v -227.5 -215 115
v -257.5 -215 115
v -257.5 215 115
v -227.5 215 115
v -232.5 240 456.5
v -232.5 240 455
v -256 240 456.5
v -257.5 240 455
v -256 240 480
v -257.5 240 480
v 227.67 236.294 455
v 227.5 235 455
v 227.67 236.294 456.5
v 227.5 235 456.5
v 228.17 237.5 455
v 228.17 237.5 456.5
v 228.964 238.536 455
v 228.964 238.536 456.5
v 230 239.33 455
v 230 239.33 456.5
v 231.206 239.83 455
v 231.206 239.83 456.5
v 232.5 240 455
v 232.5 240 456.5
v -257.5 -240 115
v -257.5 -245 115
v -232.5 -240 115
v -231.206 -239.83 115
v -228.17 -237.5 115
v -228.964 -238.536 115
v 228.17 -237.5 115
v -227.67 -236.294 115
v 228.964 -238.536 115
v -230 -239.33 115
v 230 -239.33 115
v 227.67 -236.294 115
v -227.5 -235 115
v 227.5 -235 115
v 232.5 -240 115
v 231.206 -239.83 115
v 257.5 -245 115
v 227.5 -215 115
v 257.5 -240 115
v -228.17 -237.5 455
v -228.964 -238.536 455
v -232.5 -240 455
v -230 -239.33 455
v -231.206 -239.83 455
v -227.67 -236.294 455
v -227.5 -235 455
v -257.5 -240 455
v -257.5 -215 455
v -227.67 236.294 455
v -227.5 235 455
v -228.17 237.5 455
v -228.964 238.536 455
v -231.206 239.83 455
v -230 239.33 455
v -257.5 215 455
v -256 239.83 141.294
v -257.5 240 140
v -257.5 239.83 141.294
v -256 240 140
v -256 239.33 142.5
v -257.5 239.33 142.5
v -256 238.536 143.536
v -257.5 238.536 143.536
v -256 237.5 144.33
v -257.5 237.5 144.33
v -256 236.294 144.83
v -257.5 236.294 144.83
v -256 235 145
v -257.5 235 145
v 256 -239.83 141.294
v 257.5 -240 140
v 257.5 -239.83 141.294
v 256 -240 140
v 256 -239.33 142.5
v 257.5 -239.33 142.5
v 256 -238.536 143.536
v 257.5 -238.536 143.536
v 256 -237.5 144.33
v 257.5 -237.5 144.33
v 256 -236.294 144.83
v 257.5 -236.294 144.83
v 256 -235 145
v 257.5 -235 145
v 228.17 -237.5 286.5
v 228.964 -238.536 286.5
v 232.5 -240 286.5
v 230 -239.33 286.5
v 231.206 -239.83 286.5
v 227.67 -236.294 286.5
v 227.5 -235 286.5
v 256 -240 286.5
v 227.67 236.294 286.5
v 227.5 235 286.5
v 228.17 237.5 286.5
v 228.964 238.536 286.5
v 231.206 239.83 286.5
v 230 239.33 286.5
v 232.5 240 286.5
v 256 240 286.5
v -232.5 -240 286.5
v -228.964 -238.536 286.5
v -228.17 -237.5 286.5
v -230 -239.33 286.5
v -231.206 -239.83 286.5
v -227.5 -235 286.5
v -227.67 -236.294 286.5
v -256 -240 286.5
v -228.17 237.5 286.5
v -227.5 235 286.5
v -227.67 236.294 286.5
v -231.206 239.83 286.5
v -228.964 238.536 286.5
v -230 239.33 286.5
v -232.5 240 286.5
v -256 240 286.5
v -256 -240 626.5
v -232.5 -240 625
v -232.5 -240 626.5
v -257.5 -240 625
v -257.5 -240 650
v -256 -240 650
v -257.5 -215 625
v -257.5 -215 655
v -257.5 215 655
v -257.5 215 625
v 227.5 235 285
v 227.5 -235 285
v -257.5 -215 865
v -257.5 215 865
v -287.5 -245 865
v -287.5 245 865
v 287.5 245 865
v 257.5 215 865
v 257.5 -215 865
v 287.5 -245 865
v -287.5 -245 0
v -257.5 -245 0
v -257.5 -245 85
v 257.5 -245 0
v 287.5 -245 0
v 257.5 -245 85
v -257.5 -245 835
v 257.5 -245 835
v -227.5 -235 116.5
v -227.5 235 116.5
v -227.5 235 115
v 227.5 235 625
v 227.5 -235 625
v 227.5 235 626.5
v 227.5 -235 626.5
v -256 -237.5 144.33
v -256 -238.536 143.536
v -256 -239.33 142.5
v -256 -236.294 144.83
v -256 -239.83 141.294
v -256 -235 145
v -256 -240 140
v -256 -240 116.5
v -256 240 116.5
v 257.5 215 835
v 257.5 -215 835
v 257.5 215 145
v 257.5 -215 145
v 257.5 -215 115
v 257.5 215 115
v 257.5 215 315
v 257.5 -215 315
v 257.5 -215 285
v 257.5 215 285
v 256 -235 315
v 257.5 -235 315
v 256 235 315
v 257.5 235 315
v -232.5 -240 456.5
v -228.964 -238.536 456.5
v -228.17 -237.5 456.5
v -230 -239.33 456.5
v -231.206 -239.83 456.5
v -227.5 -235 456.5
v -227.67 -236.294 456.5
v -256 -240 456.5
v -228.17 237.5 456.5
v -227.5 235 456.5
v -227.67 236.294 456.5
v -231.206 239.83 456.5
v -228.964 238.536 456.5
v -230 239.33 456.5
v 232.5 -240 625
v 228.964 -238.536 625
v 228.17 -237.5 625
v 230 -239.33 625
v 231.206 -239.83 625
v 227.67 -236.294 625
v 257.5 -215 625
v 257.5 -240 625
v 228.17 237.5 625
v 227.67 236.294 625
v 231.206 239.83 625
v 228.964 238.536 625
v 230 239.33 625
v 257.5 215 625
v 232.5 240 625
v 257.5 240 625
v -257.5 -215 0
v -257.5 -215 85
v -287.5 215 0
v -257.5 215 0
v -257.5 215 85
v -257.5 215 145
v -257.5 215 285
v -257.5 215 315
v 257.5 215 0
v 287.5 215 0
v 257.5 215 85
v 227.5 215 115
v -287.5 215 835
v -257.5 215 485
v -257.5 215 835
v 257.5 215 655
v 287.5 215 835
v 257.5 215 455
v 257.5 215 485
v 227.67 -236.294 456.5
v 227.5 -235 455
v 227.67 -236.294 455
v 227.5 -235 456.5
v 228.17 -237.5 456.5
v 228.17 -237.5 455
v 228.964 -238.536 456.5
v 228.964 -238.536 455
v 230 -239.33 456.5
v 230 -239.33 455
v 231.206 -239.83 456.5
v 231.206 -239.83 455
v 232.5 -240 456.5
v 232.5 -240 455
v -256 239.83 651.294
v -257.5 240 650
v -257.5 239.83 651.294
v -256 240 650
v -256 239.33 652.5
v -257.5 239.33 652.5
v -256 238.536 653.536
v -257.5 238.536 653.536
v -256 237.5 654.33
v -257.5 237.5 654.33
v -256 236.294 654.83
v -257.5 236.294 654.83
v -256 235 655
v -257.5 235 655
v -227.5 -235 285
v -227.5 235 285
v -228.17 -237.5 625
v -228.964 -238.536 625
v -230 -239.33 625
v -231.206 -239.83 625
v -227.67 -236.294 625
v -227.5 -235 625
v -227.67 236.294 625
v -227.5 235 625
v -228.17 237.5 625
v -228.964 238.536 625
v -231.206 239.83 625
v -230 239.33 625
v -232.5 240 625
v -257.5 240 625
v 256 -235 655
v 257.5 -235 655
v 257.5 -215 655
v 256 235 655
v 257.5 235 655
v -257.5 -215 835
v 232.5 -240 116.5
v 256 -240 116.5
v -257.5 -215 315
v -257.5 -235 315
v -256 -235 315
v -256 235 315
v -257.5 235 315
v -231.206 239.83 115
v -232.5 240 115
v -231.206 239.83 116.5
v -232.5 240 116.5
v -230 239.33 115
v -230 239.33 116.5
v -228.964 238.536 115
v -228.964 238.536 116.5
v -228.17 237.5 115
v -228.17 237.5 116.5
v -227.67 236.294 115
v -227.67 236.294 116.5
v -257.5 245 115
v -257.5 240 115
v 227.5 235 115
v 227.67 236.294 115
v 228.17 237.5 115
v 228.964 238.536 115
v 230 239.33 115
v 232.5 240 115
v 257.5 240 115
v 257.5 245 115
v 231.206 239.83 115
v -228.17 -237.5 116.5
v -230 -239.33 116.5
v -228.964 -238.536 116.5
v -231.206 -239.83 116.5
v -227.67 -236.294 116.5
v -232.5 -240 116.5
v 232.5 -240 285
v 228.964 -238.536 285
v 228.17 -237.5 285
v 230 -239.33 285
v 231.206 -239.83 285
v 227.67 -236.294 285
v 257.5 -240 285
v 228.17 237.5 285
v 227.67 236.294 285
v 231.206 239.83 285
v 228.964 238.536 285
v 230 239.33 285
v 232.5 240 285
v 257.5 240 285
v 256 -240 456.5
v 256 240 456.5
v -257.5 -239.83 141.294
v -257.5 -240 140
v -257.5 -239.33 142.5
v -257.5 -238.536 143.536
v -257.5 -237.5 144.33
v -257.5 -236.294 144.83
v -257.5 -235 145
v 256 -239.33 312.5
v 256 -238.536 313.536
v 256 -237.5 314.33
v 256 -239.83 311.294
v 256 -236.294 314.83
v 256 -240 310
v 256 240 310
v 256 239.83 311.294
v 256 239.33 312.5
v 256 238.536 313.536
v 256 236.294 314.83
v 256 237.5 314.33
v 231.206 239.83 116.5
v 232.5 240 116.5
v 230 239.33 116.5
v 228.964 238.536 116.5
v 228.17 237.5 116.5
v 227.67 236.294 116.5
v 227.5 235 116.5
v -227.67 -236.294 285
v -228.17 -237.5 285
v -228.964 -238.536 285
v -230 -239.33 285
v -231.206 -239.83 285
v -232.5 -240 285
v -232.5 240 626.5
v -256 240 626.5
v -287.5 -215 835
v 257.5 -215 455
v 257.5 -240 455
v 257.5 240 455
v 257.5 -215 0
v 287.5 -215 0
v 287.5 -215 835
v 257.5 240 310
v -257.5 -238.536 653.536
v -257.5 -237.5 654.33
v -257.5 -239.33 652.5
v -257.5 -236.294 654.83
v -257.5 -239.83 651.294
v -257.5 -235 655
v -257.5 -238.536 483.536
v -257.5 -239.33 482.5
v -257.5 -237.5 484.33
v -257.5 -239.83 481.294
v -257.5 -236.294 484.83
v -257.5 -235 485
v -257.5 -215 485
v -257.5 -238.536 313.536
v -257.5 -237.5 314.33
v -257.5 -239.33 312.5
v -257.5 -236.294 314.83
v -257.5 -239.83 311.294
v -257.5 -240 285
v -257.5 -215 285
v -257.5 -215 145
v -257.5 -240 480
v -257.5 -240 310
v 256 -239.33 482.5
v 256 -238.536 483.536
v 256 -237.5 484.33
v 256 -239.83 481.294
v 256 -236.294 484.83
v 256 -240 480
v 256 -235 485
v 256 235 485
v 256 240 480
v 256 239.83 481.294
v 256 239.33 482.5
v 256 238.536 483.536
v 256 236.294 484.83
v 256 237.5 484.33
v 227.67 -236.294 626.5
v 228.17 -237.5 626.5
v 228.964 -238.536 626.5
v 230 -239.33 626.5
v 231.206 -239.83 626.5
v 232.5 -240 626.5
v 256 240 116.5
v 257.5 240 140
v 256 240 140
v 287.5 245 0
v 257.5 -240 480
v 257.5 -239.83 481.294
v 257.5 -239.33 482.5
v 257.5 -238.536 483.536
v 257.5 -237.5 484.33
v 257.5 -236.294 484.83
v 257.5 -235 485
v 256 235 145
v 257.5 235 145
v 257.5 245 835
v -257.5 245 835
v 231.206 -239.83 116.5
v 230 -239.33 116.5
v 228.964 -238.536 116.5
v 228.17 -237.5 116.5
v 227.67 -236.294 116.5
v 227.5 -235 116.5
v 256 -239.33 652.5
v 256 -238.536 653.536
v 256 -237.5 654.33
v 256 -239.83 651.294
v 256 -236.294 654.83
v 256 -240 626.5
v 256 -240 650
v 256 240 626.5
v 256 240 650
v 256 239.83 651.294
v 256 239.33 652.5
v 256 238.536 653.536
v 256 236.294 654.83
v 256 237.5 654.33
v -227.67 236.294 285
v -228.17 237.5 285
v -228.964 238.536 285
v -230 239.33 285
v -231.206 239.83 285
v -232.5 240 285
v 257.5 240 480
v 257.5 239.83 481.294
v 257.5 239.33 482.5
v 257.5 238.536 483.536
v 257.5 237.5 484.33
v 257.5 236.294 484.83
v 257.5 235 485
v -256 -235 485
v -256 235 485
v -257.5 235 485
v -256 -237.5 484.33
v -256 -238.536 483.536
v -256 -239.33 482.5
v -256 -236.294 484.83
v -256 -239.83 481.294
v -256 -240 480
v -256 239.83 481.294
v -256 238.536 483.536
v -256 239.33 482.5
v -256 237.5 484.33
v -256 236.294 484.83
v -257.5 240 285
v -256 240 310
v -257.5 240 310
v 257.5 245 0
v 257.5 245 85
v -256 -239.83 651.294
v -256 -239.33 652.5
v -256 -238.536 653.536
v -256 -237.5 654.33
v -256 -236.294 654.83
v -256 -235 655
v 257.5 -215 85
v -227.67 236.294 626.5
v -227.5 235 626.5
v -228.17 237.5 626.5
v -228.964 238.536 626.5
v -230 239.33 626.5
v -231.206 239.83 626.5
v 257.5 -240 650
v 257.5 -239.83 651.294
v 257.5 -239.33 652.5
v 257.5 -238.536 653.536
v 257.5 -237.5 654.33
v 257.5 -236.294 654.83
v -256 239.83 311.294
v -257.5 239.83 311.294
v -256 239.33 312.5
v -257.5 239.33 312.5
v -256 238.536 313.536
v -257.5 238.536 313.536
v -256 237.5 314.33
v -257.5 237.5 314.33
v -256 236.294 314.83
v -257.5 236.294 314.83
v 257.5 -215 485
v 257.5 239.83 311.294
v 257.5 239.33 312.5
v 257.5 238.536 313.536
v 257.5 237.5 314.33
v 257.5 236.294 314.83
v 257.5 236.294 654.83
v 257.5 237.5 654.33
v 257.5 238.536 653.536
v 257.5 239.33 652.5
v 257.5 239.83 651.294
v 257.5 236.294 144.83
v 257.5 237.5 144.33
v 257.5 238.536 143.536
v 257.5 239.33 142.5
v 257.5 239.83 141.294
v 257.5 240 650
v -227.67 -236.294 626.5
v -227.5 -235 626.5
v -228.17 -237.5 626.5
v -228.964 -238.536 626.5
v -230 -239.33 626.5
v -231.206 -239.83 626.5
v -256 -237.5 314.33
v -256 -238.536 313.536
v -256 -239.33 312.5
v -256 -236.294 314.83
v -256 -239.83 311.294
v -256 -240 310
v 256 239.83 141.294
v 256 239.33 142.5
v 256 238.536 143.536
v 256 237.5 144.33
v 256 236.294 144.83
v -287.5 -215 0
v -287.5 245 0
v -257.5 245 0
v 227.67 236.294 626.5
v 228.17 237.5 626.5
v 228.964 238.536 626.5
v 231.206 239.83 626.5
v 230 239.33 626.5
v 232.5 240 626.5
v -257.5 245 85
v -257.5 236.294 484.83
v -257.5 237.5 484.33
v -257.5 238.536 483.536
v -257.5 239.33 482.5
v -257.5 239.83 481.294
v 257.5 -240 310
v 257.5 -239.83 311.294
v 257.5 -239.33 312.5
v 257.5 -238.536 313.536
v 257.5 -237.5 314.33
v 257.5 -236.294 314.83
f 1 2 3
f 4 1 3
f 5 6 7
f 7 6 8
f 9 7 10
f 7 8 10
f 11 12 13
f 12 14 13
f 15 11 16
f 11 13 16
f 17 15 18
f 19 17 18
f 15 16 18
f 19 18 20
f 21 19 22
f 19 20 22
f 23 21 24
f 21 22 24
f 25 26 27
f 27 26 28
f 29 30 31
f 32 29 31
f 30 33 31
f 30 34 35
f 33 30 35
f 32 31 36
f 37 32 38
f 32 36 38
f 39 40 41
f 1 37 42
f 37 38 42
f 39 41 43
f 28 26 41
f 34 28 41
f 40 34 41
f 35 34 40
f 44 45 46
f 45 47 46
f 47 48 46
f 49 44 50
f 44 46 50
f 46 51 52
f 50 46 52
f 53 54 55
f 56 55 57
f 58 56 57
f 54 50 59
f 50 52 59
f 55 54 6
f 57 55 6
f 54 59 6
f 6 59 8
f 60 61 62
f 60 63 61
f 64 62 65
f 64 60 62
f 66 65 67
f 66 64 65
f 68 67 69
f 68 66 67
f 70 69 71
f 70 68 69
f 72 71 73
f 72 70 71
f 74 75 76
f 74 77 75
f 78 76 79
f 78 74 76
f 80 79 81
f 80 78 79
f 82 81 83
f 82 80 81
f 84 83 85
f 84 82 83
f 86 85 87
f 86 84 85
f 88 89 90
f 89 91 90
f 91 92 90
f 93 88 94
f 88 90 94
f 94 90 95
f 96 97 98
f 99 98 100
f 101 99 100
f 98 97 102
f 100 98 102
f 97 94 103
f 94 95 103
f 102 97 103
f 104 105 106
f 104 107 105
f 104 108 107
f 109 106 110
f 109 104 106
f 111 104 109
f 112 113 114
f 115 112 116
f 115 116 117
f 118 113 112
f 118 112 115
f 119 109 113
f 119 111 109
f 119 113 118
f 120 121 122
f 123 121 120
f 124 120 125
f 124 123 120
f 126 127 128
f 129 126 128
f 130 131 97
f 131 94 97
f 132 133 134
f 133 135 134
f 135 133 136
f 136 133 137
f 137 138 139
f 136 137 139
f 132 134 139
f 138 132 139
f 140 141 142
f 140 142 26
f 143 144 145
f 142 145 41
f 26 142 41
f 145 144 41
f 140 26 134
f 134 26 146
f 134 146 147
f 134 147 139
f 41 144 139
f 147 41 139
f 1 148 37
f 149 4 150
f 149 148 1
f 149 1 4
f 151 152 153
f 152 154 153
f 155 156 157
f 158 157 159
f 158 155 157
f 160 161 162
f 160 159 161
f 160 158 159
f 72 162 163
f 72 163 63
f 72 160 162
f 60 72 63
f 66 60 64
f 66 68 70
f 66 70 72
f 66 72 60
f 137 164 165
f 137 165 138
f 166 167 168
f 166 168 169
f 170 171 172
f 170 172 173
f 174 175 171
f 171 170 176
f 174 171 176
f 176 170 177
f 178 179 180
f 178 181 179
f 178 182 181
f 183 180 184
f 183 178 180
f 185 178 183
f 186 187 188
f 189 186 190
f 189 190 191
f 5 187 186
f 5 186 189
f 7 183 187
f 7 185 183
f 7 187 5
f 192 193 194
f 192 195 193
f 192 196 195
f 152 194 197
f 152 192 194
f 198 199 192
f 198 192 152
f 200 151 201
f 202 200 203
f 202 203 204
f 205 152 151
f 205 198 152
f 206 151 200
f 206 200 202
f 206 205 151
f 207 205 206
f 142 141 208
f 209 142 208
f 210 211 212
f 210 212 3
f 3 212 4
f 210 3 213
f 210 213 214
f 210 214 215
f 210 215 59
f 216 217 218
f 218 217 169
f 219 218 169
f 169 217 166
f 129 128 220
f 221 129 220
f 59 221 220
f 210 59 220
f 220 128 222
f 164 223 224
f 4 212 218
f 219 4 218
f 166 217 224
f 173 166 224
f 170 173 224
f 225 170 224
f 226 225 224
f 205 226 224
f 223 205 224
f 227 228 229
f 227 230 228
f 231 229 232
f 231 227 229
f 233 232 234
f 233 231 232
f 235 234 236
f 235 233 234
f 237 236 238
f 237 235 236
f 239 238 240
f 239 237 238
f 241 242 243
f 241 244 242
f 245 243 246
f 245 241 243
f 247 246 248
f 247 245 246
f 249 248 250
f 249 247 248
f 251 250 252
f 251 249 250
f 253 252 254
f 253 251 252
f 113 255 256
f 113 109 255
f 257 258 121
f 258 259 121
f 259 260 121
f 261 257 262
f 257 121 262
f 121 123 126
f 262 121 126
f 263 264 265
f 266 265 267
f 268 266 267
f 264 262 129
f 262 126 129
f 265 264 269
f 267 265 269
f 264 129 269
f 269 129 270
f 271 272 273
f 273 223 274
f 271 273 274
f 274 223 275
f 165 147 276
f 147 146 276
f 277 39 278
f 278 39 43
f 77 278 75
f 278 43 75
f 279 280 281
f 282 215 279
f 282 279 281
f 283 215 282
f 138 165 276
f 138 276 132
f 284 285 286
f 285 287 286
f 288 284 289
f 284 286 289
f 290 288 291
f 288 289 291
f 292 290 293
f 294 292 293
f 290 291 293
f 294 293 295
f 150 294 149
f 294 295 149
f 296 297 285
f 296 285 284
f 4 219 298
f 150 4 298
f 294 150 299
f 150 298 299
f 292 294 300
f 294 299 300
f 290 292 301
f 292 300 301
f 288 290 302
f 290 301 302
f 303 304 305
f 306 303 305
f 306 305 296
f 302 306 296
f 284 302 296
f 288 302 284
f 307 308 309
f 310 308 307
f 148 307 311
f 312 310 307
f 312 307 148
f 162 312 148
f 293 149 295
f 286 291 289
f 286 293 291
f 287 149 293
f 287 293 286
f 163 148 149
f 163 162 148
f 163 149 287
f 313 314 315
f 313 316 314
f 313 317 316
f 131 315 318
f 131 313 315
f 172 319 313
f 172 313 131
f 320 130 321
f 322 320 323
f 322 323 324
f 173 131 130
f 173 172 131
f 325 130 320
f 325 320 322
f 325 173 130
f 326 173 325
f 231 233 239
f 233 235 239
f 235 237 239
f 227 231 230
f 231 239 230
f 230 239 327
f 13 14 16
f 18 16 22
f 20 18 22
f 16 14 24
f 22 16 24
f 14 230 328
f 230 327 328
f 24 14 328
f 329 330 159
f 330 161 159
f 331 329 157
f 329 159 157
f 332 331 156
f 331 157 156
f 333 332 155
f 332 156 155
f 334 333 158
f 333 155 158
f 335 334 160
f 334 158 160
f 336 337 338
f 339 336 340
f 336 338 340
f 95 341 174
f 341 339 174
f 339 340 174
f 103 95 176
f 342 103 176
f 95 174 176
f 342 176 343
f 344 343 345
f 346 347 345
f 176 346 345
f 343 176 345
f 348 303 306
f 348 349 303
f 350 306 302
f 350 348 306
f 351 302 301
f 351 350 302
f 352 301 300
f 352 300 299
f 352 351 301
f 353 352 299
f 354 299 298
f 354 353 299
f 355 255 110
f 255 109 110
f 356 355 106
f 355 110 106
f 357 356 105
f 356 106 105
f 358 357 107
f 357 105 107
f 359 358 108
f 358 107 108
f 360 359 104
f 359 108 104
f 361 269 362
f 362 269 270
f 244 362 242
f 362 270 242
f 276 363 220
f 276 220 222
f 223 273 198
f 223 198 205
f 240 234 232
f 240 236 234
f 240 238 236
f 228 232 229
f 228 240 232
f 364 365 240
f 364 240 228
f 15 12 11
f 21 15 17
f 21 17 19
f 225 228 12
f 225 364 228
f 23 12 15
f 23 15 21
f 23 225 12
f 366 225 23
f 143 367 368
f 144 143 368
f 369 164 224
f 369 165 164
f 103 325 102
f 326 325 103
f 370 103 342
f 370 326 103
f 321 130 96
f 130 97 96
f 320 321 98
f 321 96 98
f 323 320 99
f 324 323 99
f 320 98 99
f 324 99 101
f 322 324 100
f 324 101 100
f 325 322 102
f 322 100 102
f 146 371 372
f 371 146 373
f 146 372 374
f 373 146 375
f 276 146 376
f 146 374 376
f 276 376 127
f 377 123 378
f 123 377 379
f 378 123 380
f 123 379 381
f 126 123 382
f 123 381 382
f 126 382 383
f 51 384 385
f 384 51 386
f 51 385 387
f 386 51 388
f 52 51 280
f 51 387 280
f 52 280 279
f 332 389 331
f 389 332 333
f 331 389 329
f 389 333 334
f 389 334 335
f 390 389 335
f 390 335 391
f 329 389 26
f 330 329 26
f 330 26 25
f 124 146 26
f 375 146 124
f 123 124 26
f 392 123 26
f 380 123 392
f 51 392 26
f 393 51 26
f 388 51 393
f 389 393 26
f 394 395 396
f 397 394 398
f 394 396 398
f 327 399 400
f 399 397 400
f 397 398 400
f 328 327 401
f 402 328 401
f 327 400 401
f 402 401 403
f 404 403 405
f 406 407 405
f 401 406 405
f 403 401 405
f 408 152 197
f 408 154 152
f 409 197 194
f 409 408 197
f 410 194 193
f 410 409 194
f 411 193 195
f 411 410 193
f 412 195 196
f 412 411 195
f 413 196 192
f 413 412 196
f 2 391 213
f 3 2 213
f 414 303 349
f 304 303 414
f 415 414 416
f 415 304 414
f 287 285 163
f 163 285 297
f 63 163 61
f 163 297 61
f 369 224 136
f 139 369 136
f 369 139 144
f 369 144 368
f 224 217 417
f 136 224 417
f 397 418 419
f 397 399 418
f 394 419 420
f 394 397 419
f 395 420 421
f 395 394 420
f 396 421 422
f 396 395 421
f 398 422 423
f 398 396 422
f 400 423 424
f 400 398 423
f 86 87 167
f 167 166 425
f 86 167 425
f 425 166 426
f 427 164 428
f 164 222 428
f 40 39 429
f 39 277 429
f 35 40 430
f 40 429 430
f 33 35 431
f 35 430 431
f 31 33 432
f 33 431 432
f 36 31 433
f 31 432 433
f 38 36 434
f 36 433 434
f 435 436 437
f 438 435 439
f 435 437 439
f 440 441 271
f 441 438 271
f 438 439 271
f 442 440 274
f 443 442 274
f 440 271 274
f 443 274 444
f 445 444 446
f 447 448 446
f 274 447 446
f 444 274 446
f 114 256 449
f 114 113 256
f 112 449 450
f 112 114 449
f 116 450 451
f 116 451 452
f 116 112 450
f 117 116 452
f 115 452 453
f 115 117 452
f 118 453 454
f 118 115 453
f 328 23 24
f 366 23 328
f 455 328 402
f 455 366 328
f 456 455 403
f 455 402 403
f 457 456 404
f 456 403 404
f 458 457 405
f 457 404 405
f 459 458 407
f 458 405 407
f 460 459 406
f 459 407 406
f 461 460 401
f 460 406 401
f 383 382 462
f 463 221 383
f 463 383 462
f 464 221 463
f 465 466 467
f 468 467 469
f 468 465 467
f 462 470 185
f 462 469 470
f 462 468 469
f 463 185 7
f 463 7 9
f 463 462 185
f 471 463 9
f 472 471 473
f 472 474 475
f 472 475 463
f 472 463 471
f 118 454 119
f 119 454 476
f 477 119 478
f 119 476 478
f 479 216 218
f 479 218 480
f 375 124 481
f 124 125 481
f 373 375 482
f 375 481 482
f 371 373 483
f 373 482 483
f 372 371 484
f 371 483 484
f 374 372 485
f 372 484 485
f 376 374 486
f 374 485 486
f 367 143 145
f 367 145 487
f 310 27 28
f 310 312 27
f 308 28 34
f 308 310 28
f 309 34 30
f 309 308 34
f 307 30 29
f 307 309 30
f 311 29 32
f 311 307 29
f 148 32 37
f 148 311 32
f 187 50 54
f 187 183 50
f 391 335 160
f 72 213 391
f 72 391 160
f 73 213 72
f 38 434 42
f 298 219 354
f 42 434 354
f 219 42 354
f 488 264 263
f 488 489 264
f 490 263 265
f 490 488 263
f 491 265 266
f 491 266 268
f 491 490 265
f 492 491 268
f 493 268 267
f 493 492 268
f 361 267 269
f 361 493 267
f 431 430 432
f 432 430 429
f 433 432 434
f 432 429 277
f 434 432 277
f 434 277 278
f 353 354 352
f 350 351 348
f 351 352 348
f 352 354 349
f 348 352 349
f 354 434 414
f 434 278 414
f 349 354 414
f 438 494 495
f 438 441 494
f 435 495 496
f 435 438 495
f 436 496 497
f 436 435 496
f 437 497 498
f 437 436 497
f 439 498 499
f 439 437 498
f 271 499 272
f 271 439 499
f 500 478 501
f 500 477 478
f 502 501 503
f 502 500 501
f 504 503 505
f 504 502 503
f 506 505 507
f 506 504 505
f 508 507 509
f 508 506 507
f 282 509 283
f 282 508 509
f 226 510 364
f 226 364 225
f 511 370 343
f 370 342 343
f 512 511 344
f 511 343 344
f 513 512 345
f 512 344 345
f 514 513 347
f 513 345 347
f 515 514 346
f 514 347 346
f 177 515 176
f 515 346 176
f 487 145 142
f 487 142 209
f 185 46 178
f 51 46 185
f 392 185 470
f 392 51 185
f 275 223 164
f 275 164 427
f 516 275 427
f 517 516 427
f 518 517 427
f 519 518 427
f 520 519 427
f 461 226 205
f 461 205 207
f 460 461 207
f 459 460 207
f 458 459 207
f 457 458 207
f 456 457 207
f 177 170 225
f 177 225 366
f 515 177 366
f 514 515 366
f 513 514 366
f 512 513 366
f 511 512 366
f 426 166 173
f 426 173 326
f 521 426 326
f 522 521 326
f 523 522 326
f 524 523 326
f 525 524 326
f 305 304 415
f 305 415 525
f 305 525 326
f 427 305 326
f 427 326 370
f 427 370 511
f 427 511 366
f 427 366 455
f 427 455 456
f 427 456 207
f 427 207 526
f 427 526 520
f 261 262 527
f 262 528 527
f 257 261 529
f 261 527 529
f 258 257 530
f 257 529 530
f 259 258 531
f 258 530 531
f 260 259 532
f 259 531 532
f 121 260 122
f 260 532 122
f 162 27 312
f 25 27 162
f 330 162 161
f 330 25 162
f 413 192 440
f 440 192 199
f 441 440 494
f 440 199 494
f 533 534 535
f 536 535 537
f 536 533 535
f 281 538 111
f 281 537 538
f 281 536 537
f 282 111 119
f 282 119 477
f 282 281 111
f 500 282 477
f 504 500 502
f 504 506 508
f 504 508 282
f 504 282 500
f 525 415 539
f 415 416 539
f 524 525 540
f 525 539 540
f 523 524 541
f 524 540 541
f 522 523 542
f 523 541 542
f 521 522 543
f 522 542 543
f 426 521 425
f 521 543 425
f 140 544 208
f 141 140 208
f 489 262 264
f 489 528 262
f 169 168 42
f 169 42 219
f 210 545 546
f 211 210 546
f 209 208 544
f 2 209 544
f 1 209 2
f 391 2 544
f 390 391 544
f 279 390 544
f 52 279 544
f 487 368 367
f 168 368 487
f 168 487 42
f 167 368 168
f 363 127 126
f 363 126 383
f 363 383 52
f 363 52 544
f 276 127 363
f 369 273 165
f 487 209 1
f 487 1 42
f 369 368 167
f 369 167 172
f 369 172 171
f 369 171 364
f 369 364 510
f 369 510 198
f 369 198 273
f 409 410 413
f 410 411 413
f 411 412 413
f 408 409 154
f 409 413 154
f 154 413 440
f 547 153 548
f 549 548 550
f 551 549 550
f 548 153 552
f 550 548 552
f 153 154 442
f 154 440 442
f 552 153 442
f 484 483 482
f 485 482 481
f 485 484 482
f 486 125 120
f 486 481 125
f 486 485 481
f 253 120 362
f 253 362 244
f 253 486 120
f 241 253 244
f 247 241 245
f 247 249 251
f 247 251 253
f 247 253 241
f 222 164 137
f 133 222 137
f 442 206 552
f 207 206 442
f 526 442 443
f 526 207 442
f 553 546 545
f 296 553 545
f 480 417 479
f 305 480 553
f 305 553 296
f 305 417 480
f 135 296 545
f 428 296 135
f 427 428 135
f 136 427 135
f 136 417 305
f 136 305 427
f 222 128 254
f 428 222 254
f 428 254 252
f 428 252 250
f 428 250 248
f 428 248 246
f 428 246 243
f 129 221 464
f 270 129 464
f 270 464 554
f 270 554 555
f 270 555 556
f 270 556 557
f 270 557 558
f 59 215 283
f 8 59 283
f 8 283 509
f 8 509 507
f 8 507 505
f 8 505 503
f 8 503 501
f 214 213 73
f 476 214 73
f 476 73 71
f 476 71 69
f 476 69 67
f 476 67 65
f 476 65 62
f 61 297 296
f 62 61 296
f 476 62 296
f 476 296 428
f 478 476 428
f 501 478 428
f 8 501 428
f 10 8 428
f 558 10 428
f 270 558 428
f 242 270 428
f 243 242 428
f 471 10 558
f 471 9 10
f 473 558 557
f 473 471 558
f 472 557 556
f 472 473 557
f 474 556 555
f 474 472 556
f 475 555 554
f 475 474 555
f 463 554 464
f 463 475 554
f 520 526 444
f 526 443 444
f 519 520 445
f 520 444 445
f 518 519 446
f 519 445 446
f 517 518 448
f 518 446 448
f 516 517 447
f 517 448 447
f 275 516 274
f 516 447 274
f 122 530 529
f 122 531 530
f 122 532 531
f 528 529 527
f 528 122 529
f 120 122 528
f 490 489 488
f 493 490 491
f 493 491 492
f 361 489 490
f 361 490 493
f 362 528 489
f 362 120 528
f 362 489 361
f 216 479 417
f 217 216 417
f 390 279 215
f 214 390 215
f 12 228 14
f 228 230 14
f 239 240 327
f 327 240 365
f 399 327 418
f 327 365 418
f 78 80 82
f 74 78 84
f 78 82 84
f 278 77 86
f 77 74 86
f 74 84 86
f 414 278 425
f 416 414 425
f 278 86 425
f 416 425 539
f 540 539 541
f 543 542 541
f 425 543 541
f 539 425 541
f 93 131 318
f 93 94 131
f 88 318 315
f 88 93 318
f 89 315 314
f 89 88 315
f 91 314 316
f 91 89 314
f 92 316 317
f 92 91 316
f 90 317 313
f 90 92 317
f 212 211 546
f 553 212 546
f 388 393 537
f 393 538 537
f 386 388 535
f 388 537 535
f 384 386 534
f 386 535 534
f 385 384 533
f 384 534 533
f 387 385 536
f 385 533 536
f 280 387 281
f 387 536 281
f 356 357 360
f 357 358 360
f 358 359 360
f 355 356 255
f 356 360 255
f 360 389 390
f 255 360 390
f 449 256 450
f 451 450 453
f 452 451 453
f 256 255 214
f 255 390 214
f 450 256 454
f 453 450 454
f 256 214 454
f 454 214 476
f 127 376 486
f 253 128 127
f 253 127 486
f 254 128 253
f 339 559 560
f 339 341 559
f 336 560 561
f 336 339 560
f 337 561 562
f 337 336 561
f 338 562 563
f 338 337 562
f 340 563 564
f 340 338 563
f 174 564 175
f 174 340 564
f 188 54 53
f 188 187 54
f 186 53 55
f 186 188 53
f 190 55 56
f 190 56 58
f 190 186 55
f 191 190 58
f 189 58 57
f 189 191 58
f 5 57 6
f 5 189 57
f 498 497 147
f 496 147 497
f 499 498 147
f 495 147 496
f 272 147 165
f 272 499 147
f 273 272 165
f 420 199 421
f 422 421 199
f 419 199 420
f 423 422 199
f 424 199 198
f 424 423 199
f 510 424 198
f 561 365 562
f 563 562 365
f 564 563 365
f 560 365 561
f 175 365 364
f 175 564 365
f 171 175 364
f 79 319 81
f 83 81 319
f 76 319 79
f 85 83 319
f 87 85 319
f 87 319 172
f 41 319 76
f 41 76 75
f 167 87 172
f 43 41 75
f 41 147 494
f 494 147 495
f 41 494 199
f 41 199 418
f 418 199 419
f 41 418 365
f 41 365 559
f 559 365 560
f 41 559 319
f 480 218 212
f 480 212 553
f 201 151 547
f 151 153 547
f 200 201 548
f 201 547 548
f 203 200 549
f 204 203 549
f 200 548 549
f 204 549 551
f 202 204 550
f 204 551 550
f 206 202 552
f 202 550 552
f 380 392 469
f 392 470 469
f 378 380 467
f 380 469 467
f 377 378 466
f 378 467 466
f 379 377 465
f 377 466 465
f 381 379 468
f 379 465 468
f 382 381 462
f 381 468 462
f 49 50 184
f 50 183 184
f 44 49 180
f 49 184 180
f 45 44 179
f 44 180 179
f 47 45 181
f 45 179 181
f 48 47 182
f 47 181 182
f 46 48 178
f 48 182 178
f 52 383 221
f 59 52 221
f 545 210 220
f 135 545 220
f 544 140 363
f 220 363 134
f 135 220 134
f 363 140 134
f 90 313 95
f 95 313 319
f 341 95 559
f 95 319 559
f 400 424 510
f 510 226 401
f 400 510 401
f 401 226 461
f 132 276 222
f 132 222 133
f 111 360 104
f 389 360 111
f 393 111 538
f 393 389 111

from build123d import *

# Parameters (mm, degrees)
F0_W          = 30
F0_H          = 30
F1_DEPTH      = 865
F2_W          = 30
F2_H          = 30
F3_DEPTH      = 257.5
F3_DEPTH_BACK = 257.5
F4_W          = 30
F4_H          = 30
F5_DEPTH      = 215
F5_DEPTH_BACK = 215
F6_W          = 480
F6_H          = 30
F7_DEPTH      = 1.5
F8_W          = 480
F8_H          = 1.5
F9_DEPTH      = 28.5
F10_R         = 5


with BuildPart() as f1:
    # F0 (on Top) → F1 (new body)
    with BuildSketch(Plane.XY):
        with Locations((-272.5, 230)):
            Rectangle(F0_W, F0_H)
        with Locations((272.5, 230)):
            Rectangle(F0_W, F0_H)
        with Locations((272.5, -230)):
            Rectangle(F0_W, F0_H)
        with Locations((-272.5, -230)):
            Rectangle(F0_W, F0_H)
    extrude(amount=F1_DEPTH)

    # F2 (on Right) → F3 (join, two sides)
    with BuildSketch(Plane.YZ) as f3_sk:
        with Locations((-230, 100)):
            Rectangle(F2_W, F2_H)
        with Locations((230, 100)):
            Rectangle(F2_W, F2_H)
        with Locations((-230, 850)):
            Rectangle(F2_W, F2_H)
        with Locations((230, 850)):
            Rectangle(F2_W, F2_H)
    extrude(amount=F3_DEPTH)
    extrude(f3_sk.sketch, amount=-F3_DEPTH_BACK)

    # F4 (on Front) → F5 (join, two sides)
    with BuildSketch(Plane.XZ) as f5_sk:
        with Locations((-272.5, 850)):
            Rectangle(F4_W, F4_H)
        with Locations((272.5, 850)):
            Rectangle(F4_W, F4_H)
    extrude(amount=F5_DEPTH)
    extrude(f5_sk.sketch, amount=-F5_DEPTH_BACK)



with BuildPart() as f7:
    # F6 (on face) → F7 (new body)
    with BuildSketch(Plane.YZ.offset(-257.5)):
        with Locations((0, 130)):
            Rectangle(F6_W, F6_H)
        with Locations((0, 300)):
            Rectangle(F6_W, F6_H)
        with Locations((0, 470)):
            Rectangle(F6_W, F6_H)
        with Locations((0, 640)):
            Rectangle(F6_W, F6_H)
    extrude(amount=F7_DEPTH)


with BuildPart() as f1_1:
    add(f1.part)

    add(f7.part)  # F9 merges F7
    # F8 (on face) → F9 (join)
    with BuildSketch(Plane.YZ.offset(-256)):
        with Locations((0, 115.75)):
            Rectangle(F8_W, F8_H)
        with Locations((0, 285.75)):
            Rectangle(F8_W, F8_H)
        with Locations((0, 455.75)):
            Rectangle(F8_W, F8_H)
        with Locations((0, 625.75)):
            Rectangle(F8_W, F8_H)
    extrude(amount=F9_DEPTH)

    # F10
    f10_edges = [f1_1.edges().sort_by_distance(p)[0] for p in [
        (-256.75, -240, 145),
        (-256.75, 240, 145),
        (-227.5, 240, 115.75),
        (-227.5, -240, 115.75),
        (-256.75, -240, 315),
        (-227.5, -240, 285.75),
        (-227.5, -240, 455.75),
        (-256.75, -240, 485),
        (-227.5, -240, 625.75),
        (-256.75, -240, 655),
        (-256.75, 240, 655),
        (-227.5, 240, 625.75),
        (-227.5, 240, 455.75),
        (-256.75, 240, 485),
        (-227.5, 240, 285.75),
        (-256.75, 240, 315),
    ]]
    fillet(f10_edges, radius=F10_R)

    # F11: F1 across plane


with BuildPart() as f1_2:
    add(f1_1.part)
    add(f1_1.part.mirror(Plane.YZ))


solid = f1_2.part
